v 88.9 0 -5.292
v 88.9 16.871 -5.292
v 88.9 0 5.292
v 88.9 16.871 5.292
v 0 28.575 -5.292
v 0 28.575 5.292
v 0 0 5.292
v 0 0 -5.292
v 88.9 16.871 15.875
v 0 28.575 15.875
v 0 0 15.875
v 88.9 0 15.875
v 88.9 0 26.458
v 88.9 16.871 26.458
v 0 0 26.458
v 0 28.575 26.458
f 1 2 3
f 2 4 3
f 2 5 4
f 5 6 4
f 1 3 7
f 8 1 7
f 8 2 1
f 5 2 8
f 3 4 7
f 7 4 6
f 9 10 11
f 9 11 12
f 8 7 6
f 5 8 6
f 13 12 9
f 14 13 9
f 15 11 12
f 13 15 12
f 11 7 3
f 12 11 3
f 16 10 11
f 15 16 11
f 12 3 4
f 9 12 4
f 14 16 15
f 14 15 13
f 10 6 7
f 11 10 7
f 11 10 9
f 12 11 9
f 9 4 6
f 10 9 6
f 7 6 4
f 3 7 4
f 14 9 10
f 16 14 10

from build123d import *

# Parameters (mm, degrees)
BOSS_EXTRUDE1_DEPTH = 5.291666667
BOSS_EXTRUDE2_DEPTH = 10.583333333
BOSS_EXTRUDE3_DEPTH = 10.583333333


with BuildPart() as part:
    # Sketch1 → Boss-Extrude1 (new, symmetric)
    with BuildSketch(Plane.XY):
        Polygon((0, 0), (0, 28.575), (88.9, 16.871092964), (88.9, 0), align=None)
    extrude(amount=BOSS_EXTRUDE1_DEPTH, both=True)


with BuildPart() as body_2:
    # Sketch2 → Boss-Extrude2 (new body)
    with BuildSketch(Plane.XY.offset(5.291666667)):
        Polygon((88.9, 16.871092964), (0, 28.575), (0, 0), (88.9, 0), align=None)
    extrude(amount=BOSS_EXTRUDE2_DEPTH)


with BuildPart() as body_3:
    # Sketch3 → Boss-Extrude3 (new body)
    with BuildSketch(Plane.XY.offset(15.875)):
        Polygon((88.9, 0), (88.9, 16.871092964), (0, 28.575), (0, 0), align=None)
    extrude(amount=BOSS_EXTRUDE3_DEPTH)


solid = Compound([part.part, body_2.part, body_3.part])
